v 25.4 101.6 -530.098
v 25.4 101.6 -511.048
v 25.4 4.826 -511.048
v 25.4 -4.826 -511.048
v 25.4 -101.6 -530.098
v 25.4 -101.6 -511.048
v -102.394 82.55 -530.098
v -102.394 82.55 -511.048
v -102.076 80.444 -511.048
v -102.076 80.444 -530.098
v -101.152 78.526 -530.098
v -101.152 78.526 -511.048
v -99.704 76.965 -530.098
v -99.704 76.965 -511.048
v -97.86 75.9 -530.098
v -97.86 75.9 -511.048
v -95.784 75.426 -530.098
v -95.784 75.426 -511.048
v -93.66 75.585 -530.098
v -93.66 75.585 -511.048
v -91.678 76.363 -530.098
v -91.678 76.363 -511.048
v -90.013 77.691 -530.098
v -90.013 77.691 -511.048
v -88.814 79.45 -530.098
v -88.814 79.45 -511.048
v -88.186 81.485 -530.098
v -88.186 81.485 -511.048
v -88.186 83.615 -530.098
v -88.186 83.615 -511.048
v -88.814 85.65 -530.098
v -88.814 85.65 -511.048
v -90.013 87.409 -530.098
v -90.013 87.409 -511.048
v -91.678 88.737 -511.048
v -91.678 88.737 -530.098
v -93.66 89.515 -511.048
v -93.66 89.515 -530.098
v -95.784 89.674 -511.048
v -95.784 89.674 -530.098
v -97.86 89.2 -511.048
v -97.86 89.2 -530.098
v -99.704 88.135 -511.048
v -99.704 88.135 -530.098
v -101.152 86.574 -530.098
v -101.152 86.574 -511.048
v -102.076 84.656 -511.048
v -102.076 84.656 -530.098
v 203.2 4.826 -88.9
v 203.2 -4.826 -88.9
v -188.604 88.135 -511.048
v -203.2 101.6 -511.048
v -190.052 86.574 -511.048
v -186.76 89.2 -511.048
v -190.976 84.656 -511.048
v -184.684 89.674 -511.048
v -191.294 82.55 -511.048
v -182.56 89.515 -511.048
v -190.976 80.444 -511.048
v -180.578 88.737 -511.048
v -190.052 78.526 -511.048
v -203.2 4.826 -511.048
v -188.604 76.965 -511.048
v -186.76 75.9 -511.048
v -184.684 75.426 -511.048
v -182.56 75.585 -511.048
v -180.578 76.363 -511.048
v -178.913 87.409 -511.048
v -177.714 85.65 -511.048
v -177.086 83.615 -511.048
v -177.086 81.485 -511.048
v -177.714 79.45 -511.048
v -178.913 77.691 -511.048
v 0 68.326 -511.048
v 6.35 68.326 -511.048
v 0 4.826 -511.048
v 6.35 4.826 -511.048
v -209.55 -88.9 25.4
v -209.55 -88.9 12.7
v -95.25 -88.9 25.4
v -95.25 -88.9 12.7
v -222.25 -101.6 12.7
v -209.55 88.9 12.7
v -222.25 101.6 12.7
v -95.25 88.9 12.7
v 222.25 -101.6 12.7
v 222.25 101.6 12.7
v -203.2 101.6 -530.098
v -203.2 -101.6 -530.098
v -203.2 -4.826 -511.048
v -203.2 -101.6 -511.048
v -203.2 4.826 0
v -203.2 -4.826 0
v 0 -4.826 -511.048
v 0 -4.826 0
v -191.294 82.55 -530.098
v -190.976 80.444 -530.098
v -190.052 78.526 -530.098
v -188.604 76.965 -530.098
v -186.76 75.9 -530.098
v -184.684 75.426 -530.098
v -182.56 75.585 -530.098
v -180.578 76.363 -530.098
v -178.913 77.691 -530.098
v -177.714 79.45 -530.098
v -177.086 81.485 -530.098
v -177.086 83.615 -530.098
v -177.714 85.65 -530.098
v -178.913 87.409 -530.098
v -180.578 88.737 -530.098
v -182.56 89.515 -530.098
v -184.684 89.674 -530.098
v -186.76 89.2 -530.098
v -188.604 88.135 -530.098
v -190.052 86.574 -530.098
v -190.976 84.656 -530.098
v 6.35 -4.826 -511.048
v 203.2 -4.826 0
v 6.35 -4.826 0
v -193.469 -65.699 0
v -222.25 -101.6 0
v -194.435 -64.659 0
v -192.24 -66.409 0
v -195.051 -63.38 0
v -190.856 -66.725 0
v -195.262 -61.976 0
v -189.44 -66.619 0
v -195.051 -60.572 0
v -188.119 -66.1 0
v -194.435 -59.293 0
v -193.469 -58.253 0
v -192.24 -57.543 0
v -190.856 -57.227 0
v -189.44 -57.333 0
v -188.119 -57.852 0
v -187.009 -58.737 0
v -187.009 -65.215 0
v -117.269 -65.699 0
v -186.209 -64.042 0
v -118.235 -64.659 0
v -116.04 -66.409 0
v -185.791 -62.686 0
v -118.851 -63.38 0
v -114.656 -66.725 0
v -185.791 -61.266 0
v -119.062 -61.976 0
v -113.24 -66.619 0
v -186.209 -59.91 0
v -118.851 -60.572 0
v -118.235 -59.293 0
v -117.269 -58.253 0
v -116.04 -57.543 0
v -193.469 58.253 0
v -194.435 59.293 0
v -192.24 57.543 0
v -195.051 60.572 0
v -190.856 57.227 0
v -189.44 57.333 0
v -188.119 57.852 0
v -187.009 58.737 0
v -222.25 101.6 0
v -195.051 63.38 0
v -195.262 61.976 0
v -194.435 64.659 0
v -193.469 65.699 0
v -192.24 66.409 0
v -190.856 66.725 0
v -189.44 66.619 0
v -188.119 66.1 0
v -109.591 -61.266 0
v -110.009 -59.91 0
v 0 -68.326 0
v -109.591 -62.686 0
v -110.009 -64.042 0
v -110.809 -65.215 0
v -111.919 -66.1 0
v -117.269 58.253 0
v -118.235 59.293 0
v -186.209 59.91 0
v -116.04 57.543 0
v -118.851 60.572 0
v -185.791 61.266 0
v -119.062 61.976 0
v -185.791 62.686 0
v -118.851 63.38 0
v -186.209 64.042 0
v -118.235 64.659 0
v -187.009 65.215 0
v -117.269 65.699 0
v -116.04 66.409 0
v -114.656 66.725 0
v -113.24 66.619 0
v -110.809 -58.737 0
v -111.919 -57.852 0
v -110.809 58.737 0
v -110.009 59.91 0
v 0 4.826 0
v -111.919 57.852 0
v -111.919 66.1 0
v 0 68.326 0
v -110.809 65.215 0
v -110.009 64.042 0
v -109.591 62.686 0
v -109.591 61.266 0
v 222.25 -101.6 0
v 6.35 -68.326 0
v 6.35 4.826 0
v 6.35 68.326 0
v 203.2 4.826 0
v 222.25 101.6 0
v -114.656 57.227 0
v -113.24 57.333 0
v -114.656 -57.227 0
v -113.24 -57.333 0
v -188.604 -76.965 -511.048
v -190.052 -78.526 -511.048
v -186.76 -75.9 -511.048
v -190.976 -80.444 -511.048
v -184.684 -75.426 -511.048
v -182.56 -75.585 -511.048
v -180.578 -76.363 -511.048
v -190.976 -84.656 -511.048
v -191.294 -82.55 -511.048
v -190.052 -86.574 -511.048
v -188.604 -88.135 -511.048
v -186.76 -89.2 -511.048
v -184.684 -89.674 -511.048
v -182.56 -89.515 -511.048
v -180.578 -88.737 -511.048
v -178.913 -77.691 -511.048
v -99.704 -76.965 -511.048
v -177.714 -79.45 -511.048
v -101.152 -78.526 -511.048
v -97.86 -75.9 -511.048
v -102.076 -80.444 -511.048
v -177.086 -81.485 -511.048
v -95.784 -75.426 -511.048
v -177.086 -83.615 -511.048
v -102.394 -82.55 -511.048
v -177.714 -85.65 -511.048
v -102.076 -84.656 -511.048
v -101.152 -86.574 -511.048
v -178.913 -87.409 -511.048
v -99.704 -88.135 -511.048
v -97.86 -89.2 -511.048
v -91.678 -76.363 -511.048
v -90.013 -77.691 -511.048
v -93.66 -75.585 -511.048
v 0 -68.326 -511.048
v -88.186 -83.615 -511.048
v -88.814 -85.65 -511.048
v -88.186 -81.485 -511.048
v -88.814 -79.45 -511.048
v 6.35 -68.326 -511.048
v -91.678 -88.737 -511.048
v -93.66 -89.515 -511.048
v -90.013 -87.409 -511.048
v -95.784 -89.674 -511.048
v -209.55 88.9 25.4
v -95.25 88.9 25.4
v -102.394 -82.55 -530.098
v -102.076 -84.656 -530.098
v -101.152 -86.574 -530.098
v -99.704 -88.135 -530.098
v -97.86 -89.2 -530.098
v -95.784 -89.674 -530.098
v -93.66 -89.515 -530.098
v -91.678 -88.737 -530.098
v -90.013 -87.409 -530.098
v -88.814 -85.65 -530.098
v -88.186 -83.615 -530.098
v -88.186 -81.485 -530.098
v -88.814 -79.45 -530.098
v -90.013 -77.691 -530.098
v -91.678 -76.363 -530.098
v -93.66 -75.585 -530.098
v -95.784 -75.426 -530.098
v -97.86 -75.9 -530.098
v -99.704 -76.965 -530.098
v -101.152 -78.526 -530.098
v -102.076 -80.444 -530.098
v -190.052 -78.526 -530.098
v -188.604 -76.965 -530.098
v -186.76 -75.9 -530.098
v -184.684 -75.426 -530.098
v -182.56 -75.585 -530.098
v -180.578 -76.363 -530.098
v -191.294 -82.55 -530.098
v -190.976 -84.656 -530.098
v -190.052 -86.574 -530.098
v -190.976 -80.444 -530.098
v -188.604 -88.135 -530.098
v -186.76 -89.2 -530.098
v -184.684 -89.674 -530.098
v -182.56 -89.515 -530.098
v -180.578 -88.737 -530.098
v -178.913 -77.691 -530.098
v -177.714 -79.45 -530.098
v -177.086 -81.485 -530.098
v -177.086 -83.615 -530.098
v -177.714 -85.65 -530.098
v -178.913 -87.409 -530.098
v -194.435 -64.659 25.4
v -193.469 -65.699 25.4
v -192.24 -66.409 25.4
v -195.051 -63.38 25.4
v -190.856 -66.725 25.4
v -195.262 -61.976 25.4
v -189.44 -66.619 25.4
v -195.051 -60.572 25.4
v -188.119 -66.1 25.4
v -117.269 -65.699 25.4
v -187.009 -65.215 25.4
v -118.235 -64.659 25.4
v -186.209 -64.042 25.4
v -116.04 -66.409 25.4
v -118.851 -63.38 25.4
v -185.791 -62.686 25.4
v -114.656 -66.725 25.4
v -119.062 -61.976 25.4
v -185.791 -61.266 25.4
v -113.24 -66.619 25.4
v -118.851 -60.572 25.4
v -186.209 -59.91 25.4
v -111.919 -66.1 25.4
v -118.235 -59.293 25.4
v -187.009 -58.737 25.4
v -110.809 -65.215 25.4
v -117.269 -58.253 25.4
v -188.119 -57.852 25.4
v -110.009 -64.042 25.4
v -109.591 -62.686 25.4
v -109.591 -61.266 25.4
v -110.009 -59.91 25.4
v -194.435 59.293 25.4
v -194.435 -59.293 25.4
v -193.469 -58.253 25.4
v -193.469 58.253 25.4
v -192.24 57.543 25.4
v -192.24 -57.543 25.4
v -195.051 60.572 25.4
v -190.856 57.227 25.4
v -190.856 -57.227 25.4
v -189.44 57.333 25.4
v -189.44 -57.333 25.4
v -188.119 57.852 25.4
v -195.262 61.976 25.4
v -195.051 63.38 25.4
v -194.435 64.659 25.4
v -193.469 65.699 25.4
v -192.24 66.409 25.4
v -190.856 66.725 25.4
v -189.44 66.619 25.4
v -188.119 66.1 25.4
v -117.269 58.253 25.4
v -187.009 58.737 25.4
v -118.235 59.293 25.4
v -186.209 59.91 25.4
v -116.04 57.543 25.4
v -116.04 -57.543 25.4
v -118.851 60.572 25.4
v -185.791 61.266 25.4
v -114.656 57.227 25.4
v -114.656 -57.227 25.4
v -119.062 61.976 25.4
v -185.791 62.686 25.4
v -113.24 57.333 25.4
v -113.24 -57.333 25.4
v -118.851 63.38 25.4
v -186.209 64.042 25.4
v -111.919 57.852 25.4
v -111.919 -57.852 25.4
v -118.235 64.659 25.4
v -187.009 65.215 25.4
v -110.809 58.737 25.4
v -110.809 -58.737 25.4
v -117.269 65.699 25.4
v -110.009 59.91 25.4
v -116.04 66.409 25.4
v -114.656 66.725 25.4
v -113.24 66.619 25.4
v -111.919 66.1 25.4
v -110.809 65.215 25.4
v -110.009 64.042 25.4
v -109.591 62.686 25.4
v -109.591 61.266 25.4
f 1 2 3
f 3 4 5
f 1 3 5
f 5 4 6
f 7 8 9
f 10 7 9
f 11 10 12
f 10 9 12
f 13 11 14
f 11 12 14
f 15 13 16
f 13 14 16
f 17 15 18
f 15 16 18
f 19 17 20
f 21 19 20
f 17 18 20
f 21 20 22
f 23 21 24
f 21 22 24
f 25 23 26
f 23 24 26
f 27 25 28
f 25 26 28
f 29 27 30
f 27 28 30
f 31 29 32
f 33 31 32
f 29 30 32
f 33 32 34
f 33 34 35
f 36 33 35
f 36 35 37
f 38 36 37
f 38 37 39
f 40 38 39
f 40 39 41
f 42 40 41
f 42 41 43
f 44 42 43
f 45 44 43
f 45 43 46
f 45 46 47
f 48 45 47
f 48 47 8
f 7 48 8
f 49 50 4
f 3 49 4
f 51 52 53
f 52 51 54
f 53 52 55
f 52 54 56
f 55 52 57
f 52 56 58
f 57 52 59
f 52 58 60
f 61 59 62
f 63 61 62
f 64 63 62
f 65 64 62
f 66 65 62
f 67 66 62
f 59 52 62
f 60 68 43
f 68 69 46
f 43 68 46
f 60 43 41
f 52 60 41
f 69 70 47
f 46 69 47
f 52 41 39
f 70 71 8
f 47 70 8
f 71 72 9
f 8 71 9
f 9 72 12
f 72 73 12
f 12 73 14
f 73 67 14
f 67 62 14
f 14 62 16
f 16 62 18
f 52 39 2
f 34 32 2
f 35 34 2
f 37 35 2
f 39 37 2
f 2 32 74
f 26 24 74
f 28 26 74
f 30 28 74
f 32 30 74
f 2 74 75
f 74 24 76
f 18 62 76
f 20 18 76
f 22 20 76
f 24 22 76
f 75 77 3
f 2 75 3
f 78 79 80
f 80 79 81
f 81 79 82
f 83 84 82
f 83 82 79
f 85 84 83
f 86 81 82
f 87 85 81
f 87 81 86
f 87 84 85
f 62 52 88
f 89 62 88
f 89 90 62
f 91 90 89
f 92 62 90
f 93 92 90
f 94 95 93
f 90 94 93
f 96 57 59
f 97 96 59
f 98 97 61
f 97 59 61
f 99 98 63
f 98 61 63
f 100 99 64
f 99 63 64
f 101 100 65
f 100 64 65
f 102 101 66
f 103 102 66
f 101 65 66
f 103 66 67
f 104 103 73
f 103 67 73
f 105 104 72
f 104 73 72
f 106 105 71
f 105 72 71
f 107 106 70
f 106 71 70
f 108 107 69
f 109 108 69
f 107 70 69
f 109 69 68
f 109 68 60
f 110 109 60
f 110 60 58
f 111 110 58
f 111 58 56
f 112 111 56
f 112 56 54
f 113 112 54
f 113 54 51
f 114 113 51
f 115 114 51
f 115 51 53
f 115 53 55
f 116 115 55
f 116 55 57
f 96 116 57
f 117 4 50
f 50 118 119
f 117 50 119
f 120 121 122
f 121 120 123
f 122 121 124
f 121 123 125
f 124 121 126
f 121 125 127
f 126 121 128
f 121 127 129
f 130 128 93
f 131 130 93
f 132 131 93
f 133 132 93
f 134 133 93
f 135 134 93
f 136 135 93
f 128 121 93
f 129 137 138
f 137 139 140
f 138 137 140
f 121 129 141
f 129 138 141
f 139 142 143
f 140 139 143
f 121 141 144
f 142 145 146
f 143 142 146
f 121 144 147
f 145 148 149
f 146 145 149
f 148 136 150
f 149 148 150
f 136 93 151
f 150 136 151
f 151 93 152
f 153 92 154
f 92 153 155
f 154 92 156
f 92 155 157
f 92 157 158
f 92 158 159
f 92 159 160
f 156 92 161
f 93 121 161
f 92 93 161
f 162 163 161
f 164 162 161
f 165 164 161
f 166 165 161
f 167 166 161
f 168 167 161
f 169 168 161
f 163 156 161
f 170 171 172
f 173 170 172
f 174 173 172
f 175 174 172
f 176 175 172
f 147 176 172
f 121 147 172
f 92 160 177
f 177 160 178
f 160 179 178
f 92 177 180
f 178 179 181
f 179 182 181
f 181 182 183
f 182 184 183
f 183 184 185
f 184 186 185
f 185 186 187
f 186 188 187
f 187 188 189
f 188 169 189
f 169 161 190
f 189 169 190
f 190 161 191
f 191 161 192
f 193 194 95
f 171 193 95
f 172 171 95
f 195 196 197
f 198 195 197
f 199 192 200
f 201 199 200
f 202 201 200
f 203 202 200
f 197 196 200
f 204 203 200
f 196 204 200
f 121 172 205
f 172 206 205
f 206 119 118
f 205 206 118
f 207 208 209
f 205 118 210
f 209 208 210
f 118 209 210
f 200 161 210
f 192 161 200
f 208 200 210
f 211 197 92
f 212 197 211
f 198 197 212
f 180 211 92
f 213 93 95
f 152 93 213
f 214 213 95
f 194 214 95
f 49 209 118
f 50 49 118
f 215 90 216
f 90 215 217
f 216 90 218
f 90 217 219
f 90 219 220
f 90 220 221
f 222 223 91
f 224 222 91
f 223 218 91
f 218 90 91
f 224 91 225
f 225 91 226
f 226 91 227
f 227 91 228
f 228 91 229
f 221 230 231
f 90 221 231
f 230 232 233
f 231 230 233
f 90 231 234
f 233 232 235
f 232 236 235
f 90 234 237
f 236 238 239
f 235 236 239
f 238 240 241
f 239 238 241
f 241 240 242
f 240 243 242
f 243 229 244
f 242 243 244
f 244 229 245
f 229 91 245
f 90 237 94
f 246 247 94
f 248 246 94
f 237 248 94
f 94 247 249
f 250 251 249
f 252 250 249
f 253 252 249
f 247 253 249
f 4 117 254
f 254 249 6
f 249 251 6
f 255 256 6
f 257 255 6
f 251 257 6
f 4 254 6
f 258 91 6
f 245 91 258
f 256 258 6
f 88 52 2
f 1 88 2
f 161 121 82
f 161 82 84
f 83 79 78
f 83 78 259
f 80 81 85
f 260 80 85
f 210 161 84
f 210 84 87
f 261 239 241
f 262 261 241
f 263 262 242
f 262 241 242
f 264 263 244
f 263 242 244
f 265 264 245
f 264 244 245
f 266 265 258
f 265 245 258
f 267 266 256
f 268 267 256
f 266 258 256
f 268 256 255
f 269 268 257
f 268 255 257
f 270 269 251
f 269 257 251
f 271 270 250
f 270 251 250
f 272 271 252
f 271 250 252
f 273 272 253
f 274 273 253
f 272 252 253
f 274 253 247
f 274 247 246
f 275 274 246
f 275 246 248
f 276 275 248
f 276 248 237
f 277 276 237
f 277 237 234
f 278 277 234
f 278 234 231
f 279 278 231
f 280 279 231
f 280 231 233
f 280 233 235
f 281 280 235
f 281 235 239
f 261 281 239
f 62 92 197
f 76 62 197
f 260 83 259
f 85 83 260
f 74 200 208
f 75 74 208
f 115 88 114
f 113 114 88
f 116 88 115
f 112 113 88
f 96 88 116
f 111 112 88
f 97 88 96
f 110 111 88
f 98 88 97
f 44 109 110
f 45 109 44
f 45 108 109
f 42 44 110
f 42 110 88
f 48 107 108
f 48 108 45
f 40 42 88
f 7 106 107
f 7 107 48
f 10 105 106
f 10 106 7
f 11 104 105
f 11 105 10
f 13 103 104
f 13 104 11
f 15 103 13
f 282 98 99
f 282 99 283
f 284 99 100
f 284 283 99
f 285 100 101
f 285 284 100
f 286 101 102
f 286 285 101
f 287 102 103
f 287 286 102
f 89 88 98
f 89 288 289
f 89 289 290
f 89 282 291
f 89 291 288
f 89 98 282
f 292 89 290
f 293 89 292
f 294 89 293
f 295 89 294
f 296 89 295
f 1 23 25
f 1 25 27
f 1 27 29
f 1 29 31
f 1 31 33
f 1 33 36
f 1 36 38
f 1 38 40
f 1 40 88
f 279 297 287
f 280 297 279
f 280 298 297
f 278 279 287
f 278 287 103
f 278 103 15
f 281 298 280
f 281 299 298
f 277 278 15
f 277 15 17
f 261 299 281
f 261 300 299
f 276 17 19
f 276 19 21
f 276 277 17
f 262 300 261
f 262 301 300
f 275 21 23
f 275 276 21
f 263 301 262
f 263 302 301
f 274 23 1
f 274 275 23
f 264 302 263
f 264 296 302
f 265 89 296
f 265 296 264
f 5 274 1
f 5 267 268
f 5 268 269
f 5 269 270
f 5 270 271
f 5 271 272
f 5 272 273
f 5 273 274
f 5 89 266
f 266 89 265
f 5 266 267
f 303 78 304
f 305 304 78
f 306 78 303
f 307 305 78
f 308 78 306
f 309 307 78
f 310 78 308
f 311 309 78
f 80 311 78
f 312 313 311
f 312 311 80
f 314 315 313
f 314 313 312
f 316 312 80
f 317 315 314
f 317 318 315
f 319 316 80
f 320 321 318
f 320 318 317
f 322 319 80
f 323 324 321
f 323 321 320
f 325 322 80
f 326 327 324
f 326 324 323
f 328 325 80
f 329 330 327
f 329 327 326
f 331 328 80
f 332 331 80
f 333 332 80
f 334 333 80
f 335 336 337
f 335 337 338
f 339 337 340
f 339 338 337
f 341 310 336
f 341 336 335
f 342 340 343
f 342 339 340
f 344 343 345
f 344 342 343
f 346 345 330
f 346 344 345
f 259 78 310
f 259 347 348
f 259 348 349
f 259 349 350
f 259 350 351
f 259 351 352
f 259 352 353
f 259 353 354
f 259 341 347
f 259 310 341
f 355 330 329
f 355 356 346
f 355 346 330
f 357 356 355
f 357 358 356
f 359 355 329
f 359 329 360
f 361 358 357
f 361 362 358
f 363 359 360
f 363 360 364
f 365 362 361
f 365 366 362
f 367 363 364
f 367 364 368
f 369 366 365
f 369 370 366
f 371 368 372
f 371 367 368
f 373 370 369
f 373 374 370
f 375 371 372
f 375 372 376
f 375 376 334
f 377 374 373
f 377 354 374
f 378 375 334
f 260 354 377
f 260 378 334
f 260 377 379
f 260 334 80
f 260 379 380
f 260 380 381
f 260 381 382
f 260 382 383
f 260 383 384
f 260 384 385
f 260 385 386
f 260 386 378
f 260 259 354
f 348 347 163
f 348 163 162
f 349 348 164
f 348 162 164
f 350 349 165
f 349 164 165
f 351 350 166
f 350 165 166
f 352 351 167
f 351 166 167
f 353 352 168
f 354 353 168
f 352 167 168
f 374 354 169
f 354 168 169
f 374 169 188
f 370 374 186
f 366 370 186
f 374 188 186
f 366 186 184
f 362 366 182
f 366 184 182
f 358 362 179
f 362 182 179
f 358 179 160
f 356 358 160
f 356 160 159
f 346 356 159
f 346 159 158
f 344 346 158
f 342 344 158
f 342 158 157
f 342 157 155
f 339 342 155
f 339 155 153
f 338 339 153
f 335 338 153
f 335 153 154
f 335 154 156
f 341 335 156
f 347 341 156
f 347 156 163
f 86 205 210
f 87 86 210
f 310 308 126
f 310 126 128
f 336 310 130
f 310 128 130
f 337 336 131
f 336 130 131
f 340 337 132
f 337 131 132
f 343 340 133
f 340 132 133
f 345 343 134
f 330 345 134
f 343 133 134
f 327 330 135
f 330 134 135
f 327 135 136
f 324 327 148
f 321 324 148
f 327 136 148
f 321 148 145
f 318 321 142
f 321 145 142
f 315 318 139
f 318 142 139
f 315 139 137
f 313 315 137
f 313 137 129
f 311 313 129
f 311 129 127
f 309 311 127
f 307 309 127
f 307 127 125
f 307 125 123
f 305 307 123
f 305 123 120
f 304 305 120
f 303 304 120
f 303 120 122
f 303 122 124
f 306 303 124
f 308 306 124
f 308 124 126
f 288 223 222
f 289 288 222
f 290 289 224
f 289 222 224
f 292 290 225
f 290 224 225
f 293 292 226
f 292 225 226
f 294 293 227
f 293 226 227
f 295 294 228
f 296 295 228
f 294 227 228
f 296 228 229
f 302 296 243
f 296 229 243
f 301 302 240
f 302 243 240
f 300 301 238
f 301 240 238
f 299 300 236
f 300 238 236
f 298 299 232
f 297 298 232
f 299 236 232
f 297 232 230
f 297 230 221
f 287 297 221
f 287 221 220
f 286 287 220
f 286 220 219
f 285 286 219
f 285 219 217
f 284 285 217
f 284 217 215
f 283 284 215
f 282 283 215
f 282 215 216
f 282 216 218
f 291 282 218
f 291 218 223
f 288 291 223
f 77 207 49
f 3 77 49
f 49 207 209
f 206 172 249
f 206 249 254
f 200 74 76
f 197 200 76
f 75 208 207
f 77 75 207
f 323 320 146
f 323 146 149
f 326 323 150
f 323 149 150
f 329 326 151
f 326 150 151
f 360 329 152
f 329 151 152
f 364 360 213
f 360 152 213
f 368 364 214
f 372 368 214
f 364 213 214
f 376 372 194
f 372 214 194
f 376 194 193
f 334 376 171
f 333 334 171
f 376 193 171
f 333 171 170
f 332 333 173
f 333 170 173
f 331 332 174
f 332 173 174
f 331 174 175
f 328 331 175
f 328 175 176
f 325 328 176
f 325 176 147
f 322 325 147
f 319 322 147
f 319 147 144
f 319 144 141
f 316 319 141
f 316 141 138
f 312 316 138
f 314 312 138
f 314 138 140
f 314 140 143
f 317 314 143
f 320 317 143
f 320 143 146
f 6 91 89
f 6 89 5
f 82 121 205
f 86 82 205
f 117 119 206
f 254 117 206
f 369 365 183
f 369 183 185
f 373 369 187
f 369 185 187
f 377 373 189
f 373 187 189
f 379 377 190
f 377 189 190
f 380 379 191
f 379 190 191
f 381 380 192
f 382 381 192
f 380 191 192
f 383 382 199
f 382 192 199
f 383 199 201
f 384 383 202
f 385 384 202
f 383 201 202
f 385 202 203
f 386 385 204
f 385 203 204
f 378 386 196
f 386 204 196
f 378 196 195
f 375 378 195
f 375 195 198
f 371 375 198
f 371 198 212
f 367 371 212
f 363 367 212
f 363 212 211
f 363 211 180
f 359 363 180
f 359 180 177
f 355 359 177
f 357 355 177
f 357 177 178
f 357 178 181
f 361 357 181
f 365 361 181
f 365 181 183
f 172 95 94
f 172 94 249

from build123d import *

# Parameters (mm, degrees)
F0_W      = 444.5
F0_H      = 203.2
F1_DEPTH  = 12.7
F2_W      = 114.3
F2_H      = 177.8
F3_DEPTH  = 12.7
F5_D      = 9.525
F6_W      = 203.2
F6_H      = 9.652
F6_W_2    = 6.35
F6_H_2    = 63.5
F6_W_3    = 196.85
F7_DEPTH  = 511.048
F9_DEPTH  = 106.427
F10_W     = 228.6
F10_H     = 203.2
F11_DEPTH = 19.05
F13_D     = 14.2875
F13_DEPTH = 31.75
F13_TIP   = 4.2923980472


# Not quite as in the source:
# - a length typed as a fraction of an inch, garbled in the dataset ("3 / 203.2 mm" for 3/8 in), is restored


with BuildPart() as f1:
    # F0 (on Top) → F1 (new body)
    with BuildSketch(Plane.XY):
        Rectangle(F0_W, F0_H)
    extrude(amount=F1_DEPTH)

    # F2 (on face) → F3 (join)
    with BuildSketch(Plane.XY.offset(12.7)):
        with Locations((-152.4, 0)):
            Rectangle(F2_W, F2_H)
    extrude(amount=F3_DEPTH)

    # F5 (through all)
    with Locations(Plane.XY.offset(25.4)):
        with Locations((-190.5, 61.976), (-114.3, 61.976), (-114.3, -61.976), (-190.5, -61.976)):
            Hole(F5_D / 2)

    # F6 (on face) → F7 (join)
    with BuildSketch(Plane(origin=(0, 0, 0), x_dir=(1, 0, 0), z_dir=(0, 0, -1))):
        with Locations((-101.6, 0)):
            Rectangle(F6_W, F6_H)
        with Locations((3.175, 0)):
            Rectangle(F6_W_2, F6_H)
        with Locations((3.175, -36.576)):
            Rectangle(F6_W_2, F6_H_2)
        with Locations((104.775, 0)):
            Rectangle(F6_W_3, F6_H)
        with Locations((3.175, 36.576)):
            Rectangle(F6_W_2, F6_H_2)
    extrude(amount=F7_DEPTH)

    # F8 (on face) → F9 (cut, through all)
    with BuildSketch(Plane.XZ.offset(4.826)):
        Polygon((203.2, -88.9), (25.4, -511.048), (203.2, -511.048), align=None)
    extrude(amount=-F9_DEPTH, mode=Mode.SUBTRACT)

    # F10 (on face) → F11 (join)
    with BuildSketch(Plane(origin=(0, 0, -511.048), x_dir=(1, 0, 0), z_dir=(0, 0, -1))):
        with Locations((-88.9, 0)):
            Rectangle(F10_W, F10_H)
    extrude(amount=F11_DEPTH)

    # F13
    with Locations(Plane(origin=(0, 0, -530.098), x_dir=(1, 0, 0), z_dir=(0, 0, -1))):
        with Locations((-184.15, 82.55), (-95.25, 82.55), (-95.25, -82.55), (-184.15, -82.55)):
            Hole(F13_D / 2, depth=F13_DEPTH)
            with Locations((0, 0, -(F13_DEPTH + F13_TIP / 2))):  # 118° drill point
                Cone(0, F13_D / 2, F13_TIP, mode=Mode.SUBTRACT)


solid = f1.part
